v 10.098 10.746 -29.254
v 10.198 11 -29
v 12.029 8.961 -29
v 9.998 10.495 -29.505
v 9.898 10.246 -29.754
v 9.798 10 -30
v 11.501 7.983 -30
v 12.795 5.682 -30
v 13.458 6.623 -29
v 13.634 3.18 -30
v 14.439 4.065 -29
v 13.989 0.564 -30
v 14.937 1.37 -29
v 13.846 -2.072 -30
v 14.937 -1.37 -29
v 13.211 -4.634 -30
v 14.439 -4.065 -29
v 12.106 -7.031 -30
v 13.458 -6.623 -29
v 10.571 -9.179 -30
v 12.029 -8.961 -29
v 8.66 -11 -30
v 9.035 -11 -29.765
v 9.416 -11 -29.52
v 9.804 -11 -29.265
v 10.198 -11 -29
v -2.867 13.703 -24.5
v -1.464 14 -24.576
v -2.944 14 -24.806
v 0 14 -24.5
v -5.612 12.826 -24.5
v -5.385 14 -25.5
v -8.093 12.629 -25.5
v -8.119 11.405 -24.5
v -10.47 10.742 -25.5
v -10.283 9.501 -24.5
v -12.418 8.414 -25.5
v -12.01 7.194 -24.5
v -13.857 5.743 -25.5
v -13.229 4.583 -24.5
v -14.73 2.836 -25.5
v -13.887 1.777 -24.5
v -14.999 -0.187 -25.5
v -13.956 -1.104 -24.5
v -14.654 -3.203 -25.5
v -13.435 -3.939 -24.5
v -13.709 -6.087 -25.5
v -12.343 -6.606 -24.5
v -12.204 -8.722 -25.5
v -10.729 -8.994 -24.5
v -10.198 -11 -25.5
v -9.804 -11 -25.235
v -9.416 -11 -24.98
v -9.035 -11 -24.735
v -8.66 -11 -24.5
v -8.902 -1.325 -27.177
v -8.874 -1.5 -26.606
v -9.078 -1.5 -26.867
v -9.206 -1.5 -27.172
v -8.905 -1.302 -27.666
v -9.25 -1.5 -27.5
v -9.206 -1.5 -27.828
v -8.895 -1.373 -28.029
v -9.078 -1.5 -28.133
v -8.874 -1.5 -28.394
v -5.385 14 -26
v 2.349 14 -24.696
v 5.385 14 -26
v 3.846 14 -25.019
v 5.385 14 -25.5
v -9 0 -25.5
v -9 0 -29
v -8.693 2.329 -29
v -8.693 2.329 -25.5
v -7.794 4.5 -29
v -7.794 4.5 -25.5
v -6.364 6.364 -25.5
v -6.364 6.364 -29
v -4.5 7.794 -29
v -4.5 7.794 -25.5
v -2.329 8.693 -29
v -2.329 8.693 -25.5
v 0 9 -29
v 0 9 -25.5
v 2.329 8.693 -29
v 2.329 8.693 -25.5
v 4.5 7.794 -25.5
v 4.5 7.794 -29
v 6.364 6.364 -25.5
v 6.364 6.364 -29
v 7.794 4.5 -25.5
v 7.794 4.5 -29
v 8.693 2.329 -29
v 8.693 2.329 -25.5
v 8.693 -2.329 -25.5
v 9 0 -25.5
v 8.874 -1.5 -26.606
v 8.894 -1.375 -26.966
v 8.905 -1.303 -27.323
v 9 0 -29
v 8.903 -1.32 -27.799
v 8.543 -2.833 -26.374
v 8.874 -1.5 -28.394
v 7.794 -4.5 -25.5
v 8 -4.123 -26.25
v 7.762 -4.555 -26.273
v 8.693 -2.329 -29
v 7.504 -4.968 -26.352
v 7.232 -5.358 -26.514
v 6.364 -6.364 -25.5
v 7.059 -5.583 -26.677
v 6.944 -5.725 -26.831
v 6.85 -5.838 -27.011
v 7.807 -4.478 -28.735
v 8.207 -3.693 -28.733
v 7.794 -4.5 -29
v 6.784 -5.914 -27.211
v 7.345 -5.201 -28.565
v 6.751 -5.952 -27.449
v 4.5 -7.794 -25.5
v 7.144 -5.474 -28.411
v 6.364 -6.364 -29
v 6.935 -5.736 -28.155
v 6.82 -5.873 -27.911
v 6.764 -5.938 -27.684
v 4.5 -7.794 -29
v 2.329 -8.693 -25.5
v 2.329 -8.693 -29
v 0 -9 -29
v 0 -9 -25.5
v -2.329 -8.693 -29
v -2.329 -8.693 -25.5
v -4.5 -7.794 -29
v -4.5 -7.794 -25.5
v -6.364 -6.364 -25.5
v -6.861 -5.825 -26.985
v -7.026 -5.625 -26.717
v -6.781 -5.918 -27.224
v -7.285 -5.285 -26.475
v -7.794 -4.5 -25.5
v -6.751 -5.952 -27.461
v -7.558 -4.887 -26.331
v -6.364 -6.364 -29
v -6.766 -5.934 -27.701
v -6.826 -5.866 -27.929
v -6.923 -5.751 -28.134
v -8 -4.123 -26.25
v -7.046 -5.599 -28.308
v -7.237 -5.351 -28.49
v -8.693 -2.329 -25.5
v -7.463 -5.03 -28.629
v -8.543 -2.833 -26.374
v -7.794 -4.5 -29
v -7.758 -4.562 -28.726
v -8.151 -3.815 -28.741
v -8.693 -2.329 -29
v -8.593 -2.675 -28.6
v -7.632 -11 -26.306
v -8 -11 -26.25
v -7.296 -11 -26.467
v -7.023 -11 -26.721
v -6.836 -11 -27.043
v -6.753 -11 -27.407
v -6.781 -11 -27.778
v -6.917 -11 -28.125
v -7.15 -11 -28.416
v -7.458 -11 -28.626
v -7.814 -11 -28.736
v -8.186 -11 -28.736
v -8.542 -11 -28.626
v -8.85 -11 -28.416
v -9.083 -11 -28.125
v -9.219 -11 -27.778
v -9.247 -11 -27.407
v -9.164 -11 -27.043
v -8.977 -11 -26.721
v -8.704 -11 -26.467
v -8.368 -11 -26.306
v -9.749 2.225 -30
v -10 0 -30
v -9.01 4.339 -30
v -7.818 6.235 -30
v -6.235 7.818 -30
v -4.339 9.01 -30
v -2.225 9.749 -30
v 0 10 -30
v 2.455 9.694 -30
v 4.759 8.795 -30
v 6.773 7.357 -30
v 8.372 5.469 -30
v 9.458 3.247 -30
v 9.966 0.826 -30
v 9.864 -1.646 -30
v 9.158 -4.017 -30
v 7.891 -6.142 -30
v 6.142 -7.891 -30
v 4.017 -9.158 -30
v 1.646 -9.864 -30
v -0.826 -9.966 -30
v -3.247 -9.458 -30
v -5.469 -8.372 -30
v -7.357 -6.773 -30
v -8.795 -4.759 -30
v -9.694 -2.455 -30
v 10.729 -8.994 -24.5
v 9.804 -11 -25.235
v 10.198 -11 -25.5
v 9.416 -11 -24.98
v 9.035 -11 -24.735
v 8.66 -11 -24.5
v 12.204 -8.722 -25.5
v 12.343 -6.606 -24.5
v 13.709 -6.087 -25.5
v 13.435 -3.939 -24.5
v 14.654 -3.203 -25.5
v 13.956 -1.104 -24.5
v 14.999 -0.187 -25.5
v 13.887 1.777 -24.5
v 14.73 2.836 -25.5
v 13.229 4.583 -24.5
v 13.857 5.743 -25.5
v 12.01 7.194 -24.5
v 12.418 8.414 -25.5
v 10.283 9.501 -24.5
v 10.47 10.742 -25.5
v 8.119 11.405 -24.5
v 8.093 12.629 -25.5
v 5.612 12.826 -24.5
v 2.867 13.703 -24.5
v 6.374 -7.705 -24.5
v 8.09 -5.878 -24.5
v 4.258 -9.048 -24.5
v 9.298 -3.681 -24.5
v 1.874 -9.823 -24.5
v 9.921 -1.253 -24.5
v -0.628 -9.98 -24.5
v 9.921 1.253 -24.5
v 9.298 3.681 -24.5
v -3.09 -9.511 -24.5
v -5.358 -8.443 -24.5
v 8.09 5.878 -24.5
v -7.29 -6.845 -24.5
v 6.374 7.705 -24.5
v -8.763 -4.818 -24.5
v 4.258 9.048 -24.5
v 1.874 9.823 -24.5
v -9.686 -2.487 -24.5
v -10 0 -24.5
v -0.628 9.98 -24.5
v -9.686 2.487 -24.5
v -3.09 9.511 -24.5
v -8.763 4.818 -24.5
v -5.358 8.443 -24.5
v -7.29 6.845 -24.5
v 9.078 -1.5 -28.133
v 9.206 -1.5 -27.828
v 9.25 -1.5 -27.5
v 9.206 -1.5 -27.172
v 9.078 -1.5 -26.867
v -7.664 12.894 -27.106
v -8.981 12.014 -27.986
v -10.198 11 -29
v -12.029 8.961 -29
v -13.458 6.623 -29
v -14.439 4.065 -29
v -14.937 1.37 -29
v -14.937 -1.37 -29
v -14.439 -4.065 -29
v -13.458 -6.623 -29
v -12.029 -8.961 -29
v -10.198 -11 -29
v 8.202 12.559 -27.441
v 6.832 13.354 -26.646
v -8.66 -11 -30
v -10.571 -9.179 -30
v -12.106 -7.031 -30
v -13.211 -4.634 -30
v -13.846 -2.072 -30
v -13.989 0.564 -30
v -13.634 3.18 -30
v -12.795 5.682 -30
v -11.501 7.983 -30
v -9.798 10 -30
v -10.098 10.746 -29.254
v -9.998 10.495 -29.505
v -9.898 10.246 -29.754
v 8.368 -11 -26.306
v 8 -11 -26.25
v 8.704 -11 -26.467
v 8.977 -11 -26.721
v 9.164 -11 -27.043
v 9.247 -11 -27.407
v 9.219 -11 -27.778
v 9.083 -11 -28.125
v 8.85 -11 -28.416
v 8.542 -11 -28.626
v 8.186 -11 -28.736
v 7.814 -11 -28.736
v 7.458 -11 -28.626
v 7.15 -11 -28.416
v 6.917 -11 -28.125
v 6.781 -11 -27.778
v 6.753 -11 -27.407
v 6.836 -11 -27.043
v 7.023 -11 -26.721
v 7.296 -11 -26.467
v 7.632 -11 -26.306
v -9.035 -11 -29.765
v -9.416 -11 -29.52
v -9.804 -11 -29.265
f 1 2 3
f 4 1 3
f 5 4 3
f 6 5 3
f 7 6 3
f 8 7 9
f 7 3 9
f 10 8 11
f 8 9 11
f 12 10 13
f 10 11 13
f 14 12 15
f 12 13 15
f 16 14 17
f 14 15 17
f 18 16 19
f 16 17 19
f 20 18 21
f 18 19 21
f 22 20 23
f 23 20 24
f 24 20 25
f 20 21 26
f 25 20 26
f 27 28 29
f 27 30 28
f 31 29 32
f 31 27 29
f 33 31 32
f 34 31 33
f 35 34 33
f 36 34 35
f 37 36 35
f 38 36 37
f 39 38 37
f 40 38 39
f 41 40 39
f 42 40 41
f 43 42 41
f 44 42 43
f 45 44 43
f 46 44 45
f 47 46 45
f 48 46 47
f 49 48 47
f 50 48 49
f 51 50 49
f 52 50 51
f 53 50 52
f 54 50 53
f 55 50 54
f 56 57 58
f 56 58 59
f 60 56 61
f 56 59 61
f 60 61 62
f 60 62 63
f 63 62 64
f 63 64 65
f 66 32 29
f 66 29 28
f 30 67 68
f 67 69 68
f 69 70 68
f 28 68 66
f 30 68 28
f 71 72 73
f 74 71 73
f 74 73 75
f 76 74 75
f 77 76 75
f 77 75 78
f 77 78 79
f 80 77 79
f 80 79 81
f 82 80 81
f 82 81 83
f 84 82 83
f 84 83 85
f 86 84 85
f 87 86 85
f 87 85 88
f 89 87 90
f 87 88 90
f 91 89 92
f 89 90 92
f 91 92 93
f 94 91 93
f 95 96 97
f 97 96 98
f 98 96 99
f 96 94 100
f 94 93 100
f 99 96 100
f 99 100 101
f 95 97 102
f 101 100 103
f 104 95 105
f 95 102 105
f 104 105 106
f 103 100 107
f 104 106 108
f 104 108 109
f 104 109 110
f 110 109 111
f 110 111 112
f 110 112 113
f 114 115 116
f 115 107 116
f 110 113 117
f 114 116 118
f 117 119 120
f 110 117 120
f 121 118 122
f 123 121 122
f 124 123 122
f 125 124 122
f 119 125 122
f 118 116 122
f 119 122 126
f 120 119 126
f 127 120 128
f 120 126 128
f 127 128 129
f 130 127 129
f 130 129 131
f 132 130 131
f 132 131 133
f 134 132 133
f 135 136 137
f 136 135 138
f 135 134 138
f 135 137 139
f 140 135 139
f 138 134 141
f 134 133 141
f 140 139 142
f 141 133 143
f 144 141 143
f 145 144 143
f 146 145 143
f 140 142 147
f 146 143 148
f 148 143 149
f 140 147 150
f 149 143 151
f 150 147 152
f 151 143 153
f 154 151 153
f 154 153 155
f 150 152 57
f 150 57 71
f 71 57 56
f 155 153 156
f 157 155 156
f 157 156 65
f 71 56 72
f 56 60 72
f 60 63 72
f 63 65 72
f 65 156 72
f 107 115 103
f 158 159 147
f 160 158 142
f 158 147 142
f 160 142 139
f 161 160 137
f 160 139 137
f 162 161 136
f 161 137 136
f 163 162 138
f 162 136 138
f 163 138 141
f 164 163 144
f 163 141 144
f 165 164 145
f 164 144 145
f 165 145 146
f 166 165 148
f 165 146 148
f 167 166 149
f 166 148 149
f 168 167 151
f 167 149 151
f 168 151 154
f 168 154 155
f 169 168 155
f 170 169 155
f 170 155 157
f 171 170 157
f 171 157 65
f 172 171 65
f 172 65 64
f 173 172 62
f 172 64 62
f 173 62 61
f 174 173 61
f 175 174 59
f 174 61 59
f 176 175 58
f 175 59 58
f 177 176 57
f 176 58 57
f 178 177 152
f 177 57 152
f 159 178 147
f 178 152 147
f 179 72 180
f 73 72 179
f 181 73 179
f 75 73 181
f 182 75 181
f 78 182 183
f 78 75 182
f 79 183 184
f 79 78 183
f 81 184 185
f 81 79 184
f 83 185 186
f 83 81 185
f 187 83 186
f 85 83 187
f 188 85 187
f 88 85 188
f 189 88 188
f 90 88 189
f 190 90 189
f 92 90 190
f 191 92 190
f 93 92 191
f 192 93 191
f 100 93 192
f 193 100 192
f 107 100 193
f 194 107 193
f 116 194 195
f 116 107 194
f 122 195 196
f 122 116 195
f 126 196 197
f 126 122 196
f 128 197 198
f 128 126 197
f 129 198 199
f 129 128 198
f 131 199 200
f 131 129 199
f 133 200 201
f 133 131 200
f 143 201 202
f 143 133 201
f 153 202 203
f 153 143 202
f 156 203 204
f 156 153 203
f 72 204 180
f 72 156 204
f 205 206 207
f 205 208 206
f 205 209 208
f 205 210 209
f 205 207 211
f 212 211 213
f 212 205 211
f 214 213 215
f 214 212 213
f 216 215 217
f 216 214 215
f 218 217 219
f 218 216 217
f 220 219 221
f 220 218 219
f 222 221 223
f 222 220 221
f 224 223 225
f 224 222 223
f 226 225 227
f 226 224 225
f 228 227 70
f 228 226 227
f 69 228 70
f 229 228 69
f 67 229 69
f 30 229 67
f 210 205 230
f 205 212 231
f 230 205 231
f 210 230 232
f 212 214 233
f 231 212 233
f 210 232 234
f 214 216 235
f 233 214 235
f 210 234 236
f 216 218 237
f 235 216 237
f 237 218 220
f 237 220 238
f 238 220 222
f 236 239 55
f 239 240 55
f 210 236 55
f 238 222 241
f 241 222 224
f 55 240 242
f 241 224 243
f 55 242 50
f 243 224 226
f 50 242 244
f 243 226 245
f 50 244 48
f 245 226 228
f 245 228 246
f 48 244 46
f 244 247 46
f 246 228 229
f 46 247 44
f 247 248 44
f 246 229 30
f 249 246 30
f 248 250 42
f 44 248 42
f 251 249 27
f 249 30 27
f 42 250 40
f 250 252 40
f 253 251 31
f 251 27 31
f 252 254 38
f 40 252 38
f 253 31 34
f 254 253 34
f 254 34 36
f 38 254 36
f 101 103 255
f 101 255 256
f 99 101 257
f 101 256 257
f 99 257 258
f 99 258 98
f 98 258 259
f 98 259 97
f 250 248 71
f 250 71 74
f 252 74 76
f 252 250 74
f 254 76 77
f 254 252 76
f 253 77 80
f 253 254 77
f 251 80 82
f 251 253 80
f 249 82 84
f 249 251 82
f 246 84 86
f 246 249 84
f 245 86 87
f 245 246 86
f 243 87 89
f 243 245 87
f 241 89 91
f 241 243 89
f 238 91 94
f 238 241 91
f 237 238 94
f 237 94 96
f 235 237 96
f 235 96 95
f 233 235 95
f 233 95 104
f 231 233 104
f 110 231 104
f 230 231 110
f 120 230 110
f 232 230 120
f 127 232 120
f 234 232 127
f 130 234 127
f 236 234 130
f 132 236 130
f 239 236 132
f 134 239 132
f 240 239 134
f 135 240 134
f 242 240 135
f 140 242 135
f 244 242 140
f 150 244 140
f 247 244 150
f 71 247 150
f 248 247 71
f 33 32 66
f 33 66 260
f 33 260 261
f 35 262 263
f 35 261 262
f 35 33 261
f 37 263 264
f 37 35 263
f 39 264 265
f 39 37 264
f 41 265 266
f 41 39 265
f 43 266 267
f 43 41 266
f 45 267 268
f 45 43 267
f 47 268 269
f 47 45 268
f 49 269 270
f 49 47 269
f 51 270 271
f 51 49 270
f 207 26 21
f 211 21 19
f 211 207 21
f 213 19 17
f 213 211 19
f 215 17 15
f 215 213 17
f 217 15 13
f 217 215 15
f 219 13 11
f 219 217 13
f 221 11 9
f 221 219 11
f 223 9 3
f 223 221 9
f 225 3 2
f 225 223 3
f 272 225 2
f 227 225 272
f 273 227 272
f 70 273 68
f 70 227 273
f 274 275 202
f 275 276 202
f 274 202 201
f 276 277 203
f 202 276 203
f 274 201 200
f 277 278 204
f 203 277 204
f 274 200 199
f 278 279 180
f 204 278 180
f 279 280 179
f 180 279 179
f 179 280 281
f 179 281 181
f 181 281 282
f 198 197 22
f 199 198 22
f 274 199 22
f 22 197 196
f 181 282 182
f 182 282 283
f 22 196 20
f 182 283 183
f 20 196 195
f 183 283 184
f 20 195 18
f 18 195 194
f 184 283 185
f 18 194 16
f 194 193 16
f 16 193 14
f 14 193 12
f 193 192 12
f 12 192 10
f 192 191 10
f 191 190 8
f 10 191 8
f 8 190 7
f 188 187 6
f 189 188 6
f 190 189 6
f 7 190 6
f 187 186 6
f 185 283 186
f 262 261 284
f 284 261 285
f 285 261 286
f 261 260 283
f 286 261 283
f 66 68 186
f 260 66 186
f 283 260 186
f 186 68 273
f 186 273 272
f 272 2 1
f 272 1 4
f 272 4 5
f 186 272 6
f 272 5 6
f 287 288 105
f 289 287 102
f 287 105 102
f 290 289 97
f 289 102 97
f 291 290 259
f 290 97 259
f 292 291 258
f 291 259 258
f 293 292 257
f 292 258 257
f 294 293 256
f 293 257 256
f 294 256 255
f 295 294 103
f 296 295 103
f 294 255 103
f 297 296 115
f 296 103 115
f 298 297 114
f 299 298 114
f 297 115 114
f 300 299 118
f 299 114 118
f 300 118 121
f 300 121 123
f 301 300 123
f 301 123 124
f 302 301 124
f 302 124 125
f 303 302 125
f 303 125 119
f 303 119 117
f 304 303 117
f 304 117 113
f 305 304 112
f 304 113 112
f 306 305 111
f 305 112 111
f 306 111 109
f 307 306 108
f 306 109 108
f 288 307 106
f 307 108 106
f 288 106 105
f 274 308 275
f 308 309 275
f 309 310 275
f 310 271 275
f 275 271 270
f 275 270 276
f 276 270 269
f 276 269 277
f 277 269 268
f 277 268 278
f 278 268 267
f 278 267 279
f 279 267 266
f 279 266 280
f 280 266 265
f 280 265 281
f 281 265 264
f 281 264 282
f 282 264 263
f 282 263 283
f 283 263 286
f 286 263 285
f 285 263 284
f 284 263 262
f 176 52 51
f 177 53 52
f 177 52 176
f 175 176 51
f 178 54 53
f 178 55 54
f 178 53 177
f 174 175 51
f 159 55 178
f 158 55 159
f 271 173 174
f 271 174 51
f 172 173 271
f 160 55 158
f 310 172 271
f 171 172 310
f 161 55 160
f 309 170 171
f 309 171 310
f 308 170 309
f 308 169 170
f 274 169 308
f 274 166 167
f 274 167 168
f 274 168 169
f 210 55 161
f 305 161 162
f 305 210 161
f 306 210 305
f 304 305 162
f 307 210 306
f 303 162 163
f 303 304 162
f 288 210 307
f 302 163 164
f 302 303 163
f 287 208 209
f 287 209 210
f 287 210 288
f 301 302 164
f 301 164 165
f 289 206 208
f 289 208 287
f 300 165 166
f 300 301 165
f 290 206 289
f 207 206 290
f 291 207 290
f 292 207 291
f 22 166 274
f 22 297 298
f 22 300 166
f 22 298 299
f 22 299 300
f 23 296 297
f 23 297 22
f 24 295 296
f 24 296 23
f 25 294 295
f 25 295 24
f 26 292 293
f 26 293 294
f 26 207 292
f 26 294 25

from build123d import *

# Parameters (mm, degrees)
SKETCH_1_R             = 7
SKETCH_1_R_2           = 5.5
EXTRUDE_1_DEPTH        = 30
EXTRUDE_START          = -7
SKETCH_2_R             = 15
SKETCH_2_R_2           = 5.5
EXTRUDE_2_DEPTH        = 7
SKETCH_5_W             = 5.5
SKETCH_5_H             = 9
CUT_EXTRUDE_4_DEPTH    = 15
HOLE_WIZARD_M3_1_D     = 2.5
HOLE_WIZARD_M3_1_DEPTH = 9.5
HOLE_WIZARD_M3_1_TIP   = 0.751075774
FILLET_1_R             = 1
SKETCH1_R              = 7.5
EXTRUDE1_DEPTH         = 5
CHAMFER1_SIZE          = 1
SKETCH_9_R             = 18
CUT_EXTRUDE_1_DEPTH    = 55
SKETCH_10_R            = 9
CUT_EXTRUDE_2_DEPTH    = 22.914607001
CHAMFER_5_SIZE         = 1
SKETCH_12_OUTSIDE_W    = 15.516
SKETCH_12_OUTSIDE_H    = 36.016
CUT_EXTRUDE_4_2_DEPTH  = 15


with BuildPart() as part:
    # 草图1 → 拉伸1 (new, symmetric)
    with BuildSketch(Plane.XY):
        Circle(SKETCH_1_R)
        Circle(SKETCH_1_R_2, mode=Mode.SUBTRACT)
    extrude(amount=EXTRUDE_1_DEPTH, both=True)

    # 草图2 → 拉伸2 (add)
    with BuildSketch(Plane.XY.offset(30).offset(EXTRUDE_START)):
        Circle(SKETCH_2_R)
        Circle(SKETCH_2_R_2, mode=Mode.SUBTRACT)
    extrude_2 = extrude(amount=EXTRUDE_2_DEPTH)

    # 镜向1: 拉伸2 across plane
    add(extrude_2.mirror(Plane.XY))

    # 草图5 → Cut-Extrude 4 (cut, symmetric)
    with BuildSketch(Plane(origin=(0, 0, 0), x_dir=(0, 0, -1), z_dir=(1, 0, 0))):
        with Locations((-27.25, -15.5)):
            Rectangle(SKETCH_5_W, SKETCH_5_H)
        with Locations((27.25, -15.5)):
            Rectangle(SKETCH_5_W, SKETCH_5_H)
    extrude(amount=CUT_EXTRUDE_4_DEPTH, both=True, mode=Mode.SUBTRACT)

    # M3 螺纹孔1
    with Locations(Plane(origin=(-8, -11, 27.5), x_dir=(0, 0, -1), z_dir=(0, -1, 0))):
        with Locations((0, 0), (0, 16), (55, 0), (55, 16)):
            Hole(HOLE_WIZARD_M3_1_D / 2, depth=HOLE_WIZARD_M3_1_DEPTH)
            with Locations((0, 0, -(HOLE_WIZARD_M3_1_DEPTH + HOLE_WIZARD_M3_1_TIP / 2))):  # 118° drill point
                Cone(0, HOLE_WIZARD_M3_1_D / 2, HOLE_WIZARD_M3_1_TIP, mode=Mode.SUBTRACT)

    # 圆角1
    fillet_1_edges = [part.edges().sort_by_distance(p)[0] for p in [
        (-7, 0, -23),
        (-7, 0, 23),
    ]]
    fillet(fillet_1_edges, radius=FILLET_1_R)

    # Sketch1 → Extrude1 (cut)
    with BuildSketch(Plane(origin=(0, 0, 30), x_dir=(-1, 0, 0), z_dir=(0, 0, -1))):
        Circle(SKETCH1_R)
    extrude(amount=EXTRUDE1_DEPTH, mode=Mode.SUBTRACT)

    # Chamfer1
    chamfer1_edges = [part.edges().sort_by_distance(p)[0] for p in [
        (-5.5, 0, 25),
    ]]
    chamfer(chamfer1_edges, length=CHAMFER1_SIZE)

    # 草图9 → 切除-拉伸1 (cut)
    with BuildSketch(Plane(origin=(0, 0, -24.5), x_dir=(-1, 0, 0), z_dir=(0, 0, -1))):
        Circle(SKETCH_9_R)
    extrude(amount=-CUT_EXTRUDE_1_DEPTH, mode=Mode.SUBTRACT)

    # 草图10 → 切除-拉伸2 (cut, through all)
    with BuildSketch(Plane(origin=(0, 0, -30), x_dir=(-1, 0, 0), z_dir=(0, 0, -1))):
        Circle(SKETCH_10_R)
    extrude(amount=-CUT_EXTRUDE_2_DEPTH, mode=Mode.SUBTRACT)

    # 倒角5
    chamfer_5_edges = [part.edges().sort_by_distance(p)[0] for p in [
        (9, 0, -24.5),
        (9, 0, -30),
        (0, 15, -30),
        (0, 15, -24.5),
    ]]
    chamfer(chamfer_5_edges, length=CHAMFER_5_SIZE)

    # 草图12 outside → Cut-Extrude 4 2 (cut, symmetric)
    with BuildSketch(Plane(origin=(0, 0, 0), x_dir=(0, 0, -1), z_dir=(1, 0, 0))):
        with Locations((27.25, 2)):
            Rectangle(SKETCH_12_OUTSIDE_W, SKETCH_12_OUTSIDE_H)
        Polygon((26, 14), (30, 10), (30, -11), (22, -11), (22, 14), align=None, mode=Mode.SUBTRACT)
    extrude(amount=CUT_EXTRUDE_4_2_DEPTH, both=True, mode=Mode.SUBTRACT)


solid = part.part
